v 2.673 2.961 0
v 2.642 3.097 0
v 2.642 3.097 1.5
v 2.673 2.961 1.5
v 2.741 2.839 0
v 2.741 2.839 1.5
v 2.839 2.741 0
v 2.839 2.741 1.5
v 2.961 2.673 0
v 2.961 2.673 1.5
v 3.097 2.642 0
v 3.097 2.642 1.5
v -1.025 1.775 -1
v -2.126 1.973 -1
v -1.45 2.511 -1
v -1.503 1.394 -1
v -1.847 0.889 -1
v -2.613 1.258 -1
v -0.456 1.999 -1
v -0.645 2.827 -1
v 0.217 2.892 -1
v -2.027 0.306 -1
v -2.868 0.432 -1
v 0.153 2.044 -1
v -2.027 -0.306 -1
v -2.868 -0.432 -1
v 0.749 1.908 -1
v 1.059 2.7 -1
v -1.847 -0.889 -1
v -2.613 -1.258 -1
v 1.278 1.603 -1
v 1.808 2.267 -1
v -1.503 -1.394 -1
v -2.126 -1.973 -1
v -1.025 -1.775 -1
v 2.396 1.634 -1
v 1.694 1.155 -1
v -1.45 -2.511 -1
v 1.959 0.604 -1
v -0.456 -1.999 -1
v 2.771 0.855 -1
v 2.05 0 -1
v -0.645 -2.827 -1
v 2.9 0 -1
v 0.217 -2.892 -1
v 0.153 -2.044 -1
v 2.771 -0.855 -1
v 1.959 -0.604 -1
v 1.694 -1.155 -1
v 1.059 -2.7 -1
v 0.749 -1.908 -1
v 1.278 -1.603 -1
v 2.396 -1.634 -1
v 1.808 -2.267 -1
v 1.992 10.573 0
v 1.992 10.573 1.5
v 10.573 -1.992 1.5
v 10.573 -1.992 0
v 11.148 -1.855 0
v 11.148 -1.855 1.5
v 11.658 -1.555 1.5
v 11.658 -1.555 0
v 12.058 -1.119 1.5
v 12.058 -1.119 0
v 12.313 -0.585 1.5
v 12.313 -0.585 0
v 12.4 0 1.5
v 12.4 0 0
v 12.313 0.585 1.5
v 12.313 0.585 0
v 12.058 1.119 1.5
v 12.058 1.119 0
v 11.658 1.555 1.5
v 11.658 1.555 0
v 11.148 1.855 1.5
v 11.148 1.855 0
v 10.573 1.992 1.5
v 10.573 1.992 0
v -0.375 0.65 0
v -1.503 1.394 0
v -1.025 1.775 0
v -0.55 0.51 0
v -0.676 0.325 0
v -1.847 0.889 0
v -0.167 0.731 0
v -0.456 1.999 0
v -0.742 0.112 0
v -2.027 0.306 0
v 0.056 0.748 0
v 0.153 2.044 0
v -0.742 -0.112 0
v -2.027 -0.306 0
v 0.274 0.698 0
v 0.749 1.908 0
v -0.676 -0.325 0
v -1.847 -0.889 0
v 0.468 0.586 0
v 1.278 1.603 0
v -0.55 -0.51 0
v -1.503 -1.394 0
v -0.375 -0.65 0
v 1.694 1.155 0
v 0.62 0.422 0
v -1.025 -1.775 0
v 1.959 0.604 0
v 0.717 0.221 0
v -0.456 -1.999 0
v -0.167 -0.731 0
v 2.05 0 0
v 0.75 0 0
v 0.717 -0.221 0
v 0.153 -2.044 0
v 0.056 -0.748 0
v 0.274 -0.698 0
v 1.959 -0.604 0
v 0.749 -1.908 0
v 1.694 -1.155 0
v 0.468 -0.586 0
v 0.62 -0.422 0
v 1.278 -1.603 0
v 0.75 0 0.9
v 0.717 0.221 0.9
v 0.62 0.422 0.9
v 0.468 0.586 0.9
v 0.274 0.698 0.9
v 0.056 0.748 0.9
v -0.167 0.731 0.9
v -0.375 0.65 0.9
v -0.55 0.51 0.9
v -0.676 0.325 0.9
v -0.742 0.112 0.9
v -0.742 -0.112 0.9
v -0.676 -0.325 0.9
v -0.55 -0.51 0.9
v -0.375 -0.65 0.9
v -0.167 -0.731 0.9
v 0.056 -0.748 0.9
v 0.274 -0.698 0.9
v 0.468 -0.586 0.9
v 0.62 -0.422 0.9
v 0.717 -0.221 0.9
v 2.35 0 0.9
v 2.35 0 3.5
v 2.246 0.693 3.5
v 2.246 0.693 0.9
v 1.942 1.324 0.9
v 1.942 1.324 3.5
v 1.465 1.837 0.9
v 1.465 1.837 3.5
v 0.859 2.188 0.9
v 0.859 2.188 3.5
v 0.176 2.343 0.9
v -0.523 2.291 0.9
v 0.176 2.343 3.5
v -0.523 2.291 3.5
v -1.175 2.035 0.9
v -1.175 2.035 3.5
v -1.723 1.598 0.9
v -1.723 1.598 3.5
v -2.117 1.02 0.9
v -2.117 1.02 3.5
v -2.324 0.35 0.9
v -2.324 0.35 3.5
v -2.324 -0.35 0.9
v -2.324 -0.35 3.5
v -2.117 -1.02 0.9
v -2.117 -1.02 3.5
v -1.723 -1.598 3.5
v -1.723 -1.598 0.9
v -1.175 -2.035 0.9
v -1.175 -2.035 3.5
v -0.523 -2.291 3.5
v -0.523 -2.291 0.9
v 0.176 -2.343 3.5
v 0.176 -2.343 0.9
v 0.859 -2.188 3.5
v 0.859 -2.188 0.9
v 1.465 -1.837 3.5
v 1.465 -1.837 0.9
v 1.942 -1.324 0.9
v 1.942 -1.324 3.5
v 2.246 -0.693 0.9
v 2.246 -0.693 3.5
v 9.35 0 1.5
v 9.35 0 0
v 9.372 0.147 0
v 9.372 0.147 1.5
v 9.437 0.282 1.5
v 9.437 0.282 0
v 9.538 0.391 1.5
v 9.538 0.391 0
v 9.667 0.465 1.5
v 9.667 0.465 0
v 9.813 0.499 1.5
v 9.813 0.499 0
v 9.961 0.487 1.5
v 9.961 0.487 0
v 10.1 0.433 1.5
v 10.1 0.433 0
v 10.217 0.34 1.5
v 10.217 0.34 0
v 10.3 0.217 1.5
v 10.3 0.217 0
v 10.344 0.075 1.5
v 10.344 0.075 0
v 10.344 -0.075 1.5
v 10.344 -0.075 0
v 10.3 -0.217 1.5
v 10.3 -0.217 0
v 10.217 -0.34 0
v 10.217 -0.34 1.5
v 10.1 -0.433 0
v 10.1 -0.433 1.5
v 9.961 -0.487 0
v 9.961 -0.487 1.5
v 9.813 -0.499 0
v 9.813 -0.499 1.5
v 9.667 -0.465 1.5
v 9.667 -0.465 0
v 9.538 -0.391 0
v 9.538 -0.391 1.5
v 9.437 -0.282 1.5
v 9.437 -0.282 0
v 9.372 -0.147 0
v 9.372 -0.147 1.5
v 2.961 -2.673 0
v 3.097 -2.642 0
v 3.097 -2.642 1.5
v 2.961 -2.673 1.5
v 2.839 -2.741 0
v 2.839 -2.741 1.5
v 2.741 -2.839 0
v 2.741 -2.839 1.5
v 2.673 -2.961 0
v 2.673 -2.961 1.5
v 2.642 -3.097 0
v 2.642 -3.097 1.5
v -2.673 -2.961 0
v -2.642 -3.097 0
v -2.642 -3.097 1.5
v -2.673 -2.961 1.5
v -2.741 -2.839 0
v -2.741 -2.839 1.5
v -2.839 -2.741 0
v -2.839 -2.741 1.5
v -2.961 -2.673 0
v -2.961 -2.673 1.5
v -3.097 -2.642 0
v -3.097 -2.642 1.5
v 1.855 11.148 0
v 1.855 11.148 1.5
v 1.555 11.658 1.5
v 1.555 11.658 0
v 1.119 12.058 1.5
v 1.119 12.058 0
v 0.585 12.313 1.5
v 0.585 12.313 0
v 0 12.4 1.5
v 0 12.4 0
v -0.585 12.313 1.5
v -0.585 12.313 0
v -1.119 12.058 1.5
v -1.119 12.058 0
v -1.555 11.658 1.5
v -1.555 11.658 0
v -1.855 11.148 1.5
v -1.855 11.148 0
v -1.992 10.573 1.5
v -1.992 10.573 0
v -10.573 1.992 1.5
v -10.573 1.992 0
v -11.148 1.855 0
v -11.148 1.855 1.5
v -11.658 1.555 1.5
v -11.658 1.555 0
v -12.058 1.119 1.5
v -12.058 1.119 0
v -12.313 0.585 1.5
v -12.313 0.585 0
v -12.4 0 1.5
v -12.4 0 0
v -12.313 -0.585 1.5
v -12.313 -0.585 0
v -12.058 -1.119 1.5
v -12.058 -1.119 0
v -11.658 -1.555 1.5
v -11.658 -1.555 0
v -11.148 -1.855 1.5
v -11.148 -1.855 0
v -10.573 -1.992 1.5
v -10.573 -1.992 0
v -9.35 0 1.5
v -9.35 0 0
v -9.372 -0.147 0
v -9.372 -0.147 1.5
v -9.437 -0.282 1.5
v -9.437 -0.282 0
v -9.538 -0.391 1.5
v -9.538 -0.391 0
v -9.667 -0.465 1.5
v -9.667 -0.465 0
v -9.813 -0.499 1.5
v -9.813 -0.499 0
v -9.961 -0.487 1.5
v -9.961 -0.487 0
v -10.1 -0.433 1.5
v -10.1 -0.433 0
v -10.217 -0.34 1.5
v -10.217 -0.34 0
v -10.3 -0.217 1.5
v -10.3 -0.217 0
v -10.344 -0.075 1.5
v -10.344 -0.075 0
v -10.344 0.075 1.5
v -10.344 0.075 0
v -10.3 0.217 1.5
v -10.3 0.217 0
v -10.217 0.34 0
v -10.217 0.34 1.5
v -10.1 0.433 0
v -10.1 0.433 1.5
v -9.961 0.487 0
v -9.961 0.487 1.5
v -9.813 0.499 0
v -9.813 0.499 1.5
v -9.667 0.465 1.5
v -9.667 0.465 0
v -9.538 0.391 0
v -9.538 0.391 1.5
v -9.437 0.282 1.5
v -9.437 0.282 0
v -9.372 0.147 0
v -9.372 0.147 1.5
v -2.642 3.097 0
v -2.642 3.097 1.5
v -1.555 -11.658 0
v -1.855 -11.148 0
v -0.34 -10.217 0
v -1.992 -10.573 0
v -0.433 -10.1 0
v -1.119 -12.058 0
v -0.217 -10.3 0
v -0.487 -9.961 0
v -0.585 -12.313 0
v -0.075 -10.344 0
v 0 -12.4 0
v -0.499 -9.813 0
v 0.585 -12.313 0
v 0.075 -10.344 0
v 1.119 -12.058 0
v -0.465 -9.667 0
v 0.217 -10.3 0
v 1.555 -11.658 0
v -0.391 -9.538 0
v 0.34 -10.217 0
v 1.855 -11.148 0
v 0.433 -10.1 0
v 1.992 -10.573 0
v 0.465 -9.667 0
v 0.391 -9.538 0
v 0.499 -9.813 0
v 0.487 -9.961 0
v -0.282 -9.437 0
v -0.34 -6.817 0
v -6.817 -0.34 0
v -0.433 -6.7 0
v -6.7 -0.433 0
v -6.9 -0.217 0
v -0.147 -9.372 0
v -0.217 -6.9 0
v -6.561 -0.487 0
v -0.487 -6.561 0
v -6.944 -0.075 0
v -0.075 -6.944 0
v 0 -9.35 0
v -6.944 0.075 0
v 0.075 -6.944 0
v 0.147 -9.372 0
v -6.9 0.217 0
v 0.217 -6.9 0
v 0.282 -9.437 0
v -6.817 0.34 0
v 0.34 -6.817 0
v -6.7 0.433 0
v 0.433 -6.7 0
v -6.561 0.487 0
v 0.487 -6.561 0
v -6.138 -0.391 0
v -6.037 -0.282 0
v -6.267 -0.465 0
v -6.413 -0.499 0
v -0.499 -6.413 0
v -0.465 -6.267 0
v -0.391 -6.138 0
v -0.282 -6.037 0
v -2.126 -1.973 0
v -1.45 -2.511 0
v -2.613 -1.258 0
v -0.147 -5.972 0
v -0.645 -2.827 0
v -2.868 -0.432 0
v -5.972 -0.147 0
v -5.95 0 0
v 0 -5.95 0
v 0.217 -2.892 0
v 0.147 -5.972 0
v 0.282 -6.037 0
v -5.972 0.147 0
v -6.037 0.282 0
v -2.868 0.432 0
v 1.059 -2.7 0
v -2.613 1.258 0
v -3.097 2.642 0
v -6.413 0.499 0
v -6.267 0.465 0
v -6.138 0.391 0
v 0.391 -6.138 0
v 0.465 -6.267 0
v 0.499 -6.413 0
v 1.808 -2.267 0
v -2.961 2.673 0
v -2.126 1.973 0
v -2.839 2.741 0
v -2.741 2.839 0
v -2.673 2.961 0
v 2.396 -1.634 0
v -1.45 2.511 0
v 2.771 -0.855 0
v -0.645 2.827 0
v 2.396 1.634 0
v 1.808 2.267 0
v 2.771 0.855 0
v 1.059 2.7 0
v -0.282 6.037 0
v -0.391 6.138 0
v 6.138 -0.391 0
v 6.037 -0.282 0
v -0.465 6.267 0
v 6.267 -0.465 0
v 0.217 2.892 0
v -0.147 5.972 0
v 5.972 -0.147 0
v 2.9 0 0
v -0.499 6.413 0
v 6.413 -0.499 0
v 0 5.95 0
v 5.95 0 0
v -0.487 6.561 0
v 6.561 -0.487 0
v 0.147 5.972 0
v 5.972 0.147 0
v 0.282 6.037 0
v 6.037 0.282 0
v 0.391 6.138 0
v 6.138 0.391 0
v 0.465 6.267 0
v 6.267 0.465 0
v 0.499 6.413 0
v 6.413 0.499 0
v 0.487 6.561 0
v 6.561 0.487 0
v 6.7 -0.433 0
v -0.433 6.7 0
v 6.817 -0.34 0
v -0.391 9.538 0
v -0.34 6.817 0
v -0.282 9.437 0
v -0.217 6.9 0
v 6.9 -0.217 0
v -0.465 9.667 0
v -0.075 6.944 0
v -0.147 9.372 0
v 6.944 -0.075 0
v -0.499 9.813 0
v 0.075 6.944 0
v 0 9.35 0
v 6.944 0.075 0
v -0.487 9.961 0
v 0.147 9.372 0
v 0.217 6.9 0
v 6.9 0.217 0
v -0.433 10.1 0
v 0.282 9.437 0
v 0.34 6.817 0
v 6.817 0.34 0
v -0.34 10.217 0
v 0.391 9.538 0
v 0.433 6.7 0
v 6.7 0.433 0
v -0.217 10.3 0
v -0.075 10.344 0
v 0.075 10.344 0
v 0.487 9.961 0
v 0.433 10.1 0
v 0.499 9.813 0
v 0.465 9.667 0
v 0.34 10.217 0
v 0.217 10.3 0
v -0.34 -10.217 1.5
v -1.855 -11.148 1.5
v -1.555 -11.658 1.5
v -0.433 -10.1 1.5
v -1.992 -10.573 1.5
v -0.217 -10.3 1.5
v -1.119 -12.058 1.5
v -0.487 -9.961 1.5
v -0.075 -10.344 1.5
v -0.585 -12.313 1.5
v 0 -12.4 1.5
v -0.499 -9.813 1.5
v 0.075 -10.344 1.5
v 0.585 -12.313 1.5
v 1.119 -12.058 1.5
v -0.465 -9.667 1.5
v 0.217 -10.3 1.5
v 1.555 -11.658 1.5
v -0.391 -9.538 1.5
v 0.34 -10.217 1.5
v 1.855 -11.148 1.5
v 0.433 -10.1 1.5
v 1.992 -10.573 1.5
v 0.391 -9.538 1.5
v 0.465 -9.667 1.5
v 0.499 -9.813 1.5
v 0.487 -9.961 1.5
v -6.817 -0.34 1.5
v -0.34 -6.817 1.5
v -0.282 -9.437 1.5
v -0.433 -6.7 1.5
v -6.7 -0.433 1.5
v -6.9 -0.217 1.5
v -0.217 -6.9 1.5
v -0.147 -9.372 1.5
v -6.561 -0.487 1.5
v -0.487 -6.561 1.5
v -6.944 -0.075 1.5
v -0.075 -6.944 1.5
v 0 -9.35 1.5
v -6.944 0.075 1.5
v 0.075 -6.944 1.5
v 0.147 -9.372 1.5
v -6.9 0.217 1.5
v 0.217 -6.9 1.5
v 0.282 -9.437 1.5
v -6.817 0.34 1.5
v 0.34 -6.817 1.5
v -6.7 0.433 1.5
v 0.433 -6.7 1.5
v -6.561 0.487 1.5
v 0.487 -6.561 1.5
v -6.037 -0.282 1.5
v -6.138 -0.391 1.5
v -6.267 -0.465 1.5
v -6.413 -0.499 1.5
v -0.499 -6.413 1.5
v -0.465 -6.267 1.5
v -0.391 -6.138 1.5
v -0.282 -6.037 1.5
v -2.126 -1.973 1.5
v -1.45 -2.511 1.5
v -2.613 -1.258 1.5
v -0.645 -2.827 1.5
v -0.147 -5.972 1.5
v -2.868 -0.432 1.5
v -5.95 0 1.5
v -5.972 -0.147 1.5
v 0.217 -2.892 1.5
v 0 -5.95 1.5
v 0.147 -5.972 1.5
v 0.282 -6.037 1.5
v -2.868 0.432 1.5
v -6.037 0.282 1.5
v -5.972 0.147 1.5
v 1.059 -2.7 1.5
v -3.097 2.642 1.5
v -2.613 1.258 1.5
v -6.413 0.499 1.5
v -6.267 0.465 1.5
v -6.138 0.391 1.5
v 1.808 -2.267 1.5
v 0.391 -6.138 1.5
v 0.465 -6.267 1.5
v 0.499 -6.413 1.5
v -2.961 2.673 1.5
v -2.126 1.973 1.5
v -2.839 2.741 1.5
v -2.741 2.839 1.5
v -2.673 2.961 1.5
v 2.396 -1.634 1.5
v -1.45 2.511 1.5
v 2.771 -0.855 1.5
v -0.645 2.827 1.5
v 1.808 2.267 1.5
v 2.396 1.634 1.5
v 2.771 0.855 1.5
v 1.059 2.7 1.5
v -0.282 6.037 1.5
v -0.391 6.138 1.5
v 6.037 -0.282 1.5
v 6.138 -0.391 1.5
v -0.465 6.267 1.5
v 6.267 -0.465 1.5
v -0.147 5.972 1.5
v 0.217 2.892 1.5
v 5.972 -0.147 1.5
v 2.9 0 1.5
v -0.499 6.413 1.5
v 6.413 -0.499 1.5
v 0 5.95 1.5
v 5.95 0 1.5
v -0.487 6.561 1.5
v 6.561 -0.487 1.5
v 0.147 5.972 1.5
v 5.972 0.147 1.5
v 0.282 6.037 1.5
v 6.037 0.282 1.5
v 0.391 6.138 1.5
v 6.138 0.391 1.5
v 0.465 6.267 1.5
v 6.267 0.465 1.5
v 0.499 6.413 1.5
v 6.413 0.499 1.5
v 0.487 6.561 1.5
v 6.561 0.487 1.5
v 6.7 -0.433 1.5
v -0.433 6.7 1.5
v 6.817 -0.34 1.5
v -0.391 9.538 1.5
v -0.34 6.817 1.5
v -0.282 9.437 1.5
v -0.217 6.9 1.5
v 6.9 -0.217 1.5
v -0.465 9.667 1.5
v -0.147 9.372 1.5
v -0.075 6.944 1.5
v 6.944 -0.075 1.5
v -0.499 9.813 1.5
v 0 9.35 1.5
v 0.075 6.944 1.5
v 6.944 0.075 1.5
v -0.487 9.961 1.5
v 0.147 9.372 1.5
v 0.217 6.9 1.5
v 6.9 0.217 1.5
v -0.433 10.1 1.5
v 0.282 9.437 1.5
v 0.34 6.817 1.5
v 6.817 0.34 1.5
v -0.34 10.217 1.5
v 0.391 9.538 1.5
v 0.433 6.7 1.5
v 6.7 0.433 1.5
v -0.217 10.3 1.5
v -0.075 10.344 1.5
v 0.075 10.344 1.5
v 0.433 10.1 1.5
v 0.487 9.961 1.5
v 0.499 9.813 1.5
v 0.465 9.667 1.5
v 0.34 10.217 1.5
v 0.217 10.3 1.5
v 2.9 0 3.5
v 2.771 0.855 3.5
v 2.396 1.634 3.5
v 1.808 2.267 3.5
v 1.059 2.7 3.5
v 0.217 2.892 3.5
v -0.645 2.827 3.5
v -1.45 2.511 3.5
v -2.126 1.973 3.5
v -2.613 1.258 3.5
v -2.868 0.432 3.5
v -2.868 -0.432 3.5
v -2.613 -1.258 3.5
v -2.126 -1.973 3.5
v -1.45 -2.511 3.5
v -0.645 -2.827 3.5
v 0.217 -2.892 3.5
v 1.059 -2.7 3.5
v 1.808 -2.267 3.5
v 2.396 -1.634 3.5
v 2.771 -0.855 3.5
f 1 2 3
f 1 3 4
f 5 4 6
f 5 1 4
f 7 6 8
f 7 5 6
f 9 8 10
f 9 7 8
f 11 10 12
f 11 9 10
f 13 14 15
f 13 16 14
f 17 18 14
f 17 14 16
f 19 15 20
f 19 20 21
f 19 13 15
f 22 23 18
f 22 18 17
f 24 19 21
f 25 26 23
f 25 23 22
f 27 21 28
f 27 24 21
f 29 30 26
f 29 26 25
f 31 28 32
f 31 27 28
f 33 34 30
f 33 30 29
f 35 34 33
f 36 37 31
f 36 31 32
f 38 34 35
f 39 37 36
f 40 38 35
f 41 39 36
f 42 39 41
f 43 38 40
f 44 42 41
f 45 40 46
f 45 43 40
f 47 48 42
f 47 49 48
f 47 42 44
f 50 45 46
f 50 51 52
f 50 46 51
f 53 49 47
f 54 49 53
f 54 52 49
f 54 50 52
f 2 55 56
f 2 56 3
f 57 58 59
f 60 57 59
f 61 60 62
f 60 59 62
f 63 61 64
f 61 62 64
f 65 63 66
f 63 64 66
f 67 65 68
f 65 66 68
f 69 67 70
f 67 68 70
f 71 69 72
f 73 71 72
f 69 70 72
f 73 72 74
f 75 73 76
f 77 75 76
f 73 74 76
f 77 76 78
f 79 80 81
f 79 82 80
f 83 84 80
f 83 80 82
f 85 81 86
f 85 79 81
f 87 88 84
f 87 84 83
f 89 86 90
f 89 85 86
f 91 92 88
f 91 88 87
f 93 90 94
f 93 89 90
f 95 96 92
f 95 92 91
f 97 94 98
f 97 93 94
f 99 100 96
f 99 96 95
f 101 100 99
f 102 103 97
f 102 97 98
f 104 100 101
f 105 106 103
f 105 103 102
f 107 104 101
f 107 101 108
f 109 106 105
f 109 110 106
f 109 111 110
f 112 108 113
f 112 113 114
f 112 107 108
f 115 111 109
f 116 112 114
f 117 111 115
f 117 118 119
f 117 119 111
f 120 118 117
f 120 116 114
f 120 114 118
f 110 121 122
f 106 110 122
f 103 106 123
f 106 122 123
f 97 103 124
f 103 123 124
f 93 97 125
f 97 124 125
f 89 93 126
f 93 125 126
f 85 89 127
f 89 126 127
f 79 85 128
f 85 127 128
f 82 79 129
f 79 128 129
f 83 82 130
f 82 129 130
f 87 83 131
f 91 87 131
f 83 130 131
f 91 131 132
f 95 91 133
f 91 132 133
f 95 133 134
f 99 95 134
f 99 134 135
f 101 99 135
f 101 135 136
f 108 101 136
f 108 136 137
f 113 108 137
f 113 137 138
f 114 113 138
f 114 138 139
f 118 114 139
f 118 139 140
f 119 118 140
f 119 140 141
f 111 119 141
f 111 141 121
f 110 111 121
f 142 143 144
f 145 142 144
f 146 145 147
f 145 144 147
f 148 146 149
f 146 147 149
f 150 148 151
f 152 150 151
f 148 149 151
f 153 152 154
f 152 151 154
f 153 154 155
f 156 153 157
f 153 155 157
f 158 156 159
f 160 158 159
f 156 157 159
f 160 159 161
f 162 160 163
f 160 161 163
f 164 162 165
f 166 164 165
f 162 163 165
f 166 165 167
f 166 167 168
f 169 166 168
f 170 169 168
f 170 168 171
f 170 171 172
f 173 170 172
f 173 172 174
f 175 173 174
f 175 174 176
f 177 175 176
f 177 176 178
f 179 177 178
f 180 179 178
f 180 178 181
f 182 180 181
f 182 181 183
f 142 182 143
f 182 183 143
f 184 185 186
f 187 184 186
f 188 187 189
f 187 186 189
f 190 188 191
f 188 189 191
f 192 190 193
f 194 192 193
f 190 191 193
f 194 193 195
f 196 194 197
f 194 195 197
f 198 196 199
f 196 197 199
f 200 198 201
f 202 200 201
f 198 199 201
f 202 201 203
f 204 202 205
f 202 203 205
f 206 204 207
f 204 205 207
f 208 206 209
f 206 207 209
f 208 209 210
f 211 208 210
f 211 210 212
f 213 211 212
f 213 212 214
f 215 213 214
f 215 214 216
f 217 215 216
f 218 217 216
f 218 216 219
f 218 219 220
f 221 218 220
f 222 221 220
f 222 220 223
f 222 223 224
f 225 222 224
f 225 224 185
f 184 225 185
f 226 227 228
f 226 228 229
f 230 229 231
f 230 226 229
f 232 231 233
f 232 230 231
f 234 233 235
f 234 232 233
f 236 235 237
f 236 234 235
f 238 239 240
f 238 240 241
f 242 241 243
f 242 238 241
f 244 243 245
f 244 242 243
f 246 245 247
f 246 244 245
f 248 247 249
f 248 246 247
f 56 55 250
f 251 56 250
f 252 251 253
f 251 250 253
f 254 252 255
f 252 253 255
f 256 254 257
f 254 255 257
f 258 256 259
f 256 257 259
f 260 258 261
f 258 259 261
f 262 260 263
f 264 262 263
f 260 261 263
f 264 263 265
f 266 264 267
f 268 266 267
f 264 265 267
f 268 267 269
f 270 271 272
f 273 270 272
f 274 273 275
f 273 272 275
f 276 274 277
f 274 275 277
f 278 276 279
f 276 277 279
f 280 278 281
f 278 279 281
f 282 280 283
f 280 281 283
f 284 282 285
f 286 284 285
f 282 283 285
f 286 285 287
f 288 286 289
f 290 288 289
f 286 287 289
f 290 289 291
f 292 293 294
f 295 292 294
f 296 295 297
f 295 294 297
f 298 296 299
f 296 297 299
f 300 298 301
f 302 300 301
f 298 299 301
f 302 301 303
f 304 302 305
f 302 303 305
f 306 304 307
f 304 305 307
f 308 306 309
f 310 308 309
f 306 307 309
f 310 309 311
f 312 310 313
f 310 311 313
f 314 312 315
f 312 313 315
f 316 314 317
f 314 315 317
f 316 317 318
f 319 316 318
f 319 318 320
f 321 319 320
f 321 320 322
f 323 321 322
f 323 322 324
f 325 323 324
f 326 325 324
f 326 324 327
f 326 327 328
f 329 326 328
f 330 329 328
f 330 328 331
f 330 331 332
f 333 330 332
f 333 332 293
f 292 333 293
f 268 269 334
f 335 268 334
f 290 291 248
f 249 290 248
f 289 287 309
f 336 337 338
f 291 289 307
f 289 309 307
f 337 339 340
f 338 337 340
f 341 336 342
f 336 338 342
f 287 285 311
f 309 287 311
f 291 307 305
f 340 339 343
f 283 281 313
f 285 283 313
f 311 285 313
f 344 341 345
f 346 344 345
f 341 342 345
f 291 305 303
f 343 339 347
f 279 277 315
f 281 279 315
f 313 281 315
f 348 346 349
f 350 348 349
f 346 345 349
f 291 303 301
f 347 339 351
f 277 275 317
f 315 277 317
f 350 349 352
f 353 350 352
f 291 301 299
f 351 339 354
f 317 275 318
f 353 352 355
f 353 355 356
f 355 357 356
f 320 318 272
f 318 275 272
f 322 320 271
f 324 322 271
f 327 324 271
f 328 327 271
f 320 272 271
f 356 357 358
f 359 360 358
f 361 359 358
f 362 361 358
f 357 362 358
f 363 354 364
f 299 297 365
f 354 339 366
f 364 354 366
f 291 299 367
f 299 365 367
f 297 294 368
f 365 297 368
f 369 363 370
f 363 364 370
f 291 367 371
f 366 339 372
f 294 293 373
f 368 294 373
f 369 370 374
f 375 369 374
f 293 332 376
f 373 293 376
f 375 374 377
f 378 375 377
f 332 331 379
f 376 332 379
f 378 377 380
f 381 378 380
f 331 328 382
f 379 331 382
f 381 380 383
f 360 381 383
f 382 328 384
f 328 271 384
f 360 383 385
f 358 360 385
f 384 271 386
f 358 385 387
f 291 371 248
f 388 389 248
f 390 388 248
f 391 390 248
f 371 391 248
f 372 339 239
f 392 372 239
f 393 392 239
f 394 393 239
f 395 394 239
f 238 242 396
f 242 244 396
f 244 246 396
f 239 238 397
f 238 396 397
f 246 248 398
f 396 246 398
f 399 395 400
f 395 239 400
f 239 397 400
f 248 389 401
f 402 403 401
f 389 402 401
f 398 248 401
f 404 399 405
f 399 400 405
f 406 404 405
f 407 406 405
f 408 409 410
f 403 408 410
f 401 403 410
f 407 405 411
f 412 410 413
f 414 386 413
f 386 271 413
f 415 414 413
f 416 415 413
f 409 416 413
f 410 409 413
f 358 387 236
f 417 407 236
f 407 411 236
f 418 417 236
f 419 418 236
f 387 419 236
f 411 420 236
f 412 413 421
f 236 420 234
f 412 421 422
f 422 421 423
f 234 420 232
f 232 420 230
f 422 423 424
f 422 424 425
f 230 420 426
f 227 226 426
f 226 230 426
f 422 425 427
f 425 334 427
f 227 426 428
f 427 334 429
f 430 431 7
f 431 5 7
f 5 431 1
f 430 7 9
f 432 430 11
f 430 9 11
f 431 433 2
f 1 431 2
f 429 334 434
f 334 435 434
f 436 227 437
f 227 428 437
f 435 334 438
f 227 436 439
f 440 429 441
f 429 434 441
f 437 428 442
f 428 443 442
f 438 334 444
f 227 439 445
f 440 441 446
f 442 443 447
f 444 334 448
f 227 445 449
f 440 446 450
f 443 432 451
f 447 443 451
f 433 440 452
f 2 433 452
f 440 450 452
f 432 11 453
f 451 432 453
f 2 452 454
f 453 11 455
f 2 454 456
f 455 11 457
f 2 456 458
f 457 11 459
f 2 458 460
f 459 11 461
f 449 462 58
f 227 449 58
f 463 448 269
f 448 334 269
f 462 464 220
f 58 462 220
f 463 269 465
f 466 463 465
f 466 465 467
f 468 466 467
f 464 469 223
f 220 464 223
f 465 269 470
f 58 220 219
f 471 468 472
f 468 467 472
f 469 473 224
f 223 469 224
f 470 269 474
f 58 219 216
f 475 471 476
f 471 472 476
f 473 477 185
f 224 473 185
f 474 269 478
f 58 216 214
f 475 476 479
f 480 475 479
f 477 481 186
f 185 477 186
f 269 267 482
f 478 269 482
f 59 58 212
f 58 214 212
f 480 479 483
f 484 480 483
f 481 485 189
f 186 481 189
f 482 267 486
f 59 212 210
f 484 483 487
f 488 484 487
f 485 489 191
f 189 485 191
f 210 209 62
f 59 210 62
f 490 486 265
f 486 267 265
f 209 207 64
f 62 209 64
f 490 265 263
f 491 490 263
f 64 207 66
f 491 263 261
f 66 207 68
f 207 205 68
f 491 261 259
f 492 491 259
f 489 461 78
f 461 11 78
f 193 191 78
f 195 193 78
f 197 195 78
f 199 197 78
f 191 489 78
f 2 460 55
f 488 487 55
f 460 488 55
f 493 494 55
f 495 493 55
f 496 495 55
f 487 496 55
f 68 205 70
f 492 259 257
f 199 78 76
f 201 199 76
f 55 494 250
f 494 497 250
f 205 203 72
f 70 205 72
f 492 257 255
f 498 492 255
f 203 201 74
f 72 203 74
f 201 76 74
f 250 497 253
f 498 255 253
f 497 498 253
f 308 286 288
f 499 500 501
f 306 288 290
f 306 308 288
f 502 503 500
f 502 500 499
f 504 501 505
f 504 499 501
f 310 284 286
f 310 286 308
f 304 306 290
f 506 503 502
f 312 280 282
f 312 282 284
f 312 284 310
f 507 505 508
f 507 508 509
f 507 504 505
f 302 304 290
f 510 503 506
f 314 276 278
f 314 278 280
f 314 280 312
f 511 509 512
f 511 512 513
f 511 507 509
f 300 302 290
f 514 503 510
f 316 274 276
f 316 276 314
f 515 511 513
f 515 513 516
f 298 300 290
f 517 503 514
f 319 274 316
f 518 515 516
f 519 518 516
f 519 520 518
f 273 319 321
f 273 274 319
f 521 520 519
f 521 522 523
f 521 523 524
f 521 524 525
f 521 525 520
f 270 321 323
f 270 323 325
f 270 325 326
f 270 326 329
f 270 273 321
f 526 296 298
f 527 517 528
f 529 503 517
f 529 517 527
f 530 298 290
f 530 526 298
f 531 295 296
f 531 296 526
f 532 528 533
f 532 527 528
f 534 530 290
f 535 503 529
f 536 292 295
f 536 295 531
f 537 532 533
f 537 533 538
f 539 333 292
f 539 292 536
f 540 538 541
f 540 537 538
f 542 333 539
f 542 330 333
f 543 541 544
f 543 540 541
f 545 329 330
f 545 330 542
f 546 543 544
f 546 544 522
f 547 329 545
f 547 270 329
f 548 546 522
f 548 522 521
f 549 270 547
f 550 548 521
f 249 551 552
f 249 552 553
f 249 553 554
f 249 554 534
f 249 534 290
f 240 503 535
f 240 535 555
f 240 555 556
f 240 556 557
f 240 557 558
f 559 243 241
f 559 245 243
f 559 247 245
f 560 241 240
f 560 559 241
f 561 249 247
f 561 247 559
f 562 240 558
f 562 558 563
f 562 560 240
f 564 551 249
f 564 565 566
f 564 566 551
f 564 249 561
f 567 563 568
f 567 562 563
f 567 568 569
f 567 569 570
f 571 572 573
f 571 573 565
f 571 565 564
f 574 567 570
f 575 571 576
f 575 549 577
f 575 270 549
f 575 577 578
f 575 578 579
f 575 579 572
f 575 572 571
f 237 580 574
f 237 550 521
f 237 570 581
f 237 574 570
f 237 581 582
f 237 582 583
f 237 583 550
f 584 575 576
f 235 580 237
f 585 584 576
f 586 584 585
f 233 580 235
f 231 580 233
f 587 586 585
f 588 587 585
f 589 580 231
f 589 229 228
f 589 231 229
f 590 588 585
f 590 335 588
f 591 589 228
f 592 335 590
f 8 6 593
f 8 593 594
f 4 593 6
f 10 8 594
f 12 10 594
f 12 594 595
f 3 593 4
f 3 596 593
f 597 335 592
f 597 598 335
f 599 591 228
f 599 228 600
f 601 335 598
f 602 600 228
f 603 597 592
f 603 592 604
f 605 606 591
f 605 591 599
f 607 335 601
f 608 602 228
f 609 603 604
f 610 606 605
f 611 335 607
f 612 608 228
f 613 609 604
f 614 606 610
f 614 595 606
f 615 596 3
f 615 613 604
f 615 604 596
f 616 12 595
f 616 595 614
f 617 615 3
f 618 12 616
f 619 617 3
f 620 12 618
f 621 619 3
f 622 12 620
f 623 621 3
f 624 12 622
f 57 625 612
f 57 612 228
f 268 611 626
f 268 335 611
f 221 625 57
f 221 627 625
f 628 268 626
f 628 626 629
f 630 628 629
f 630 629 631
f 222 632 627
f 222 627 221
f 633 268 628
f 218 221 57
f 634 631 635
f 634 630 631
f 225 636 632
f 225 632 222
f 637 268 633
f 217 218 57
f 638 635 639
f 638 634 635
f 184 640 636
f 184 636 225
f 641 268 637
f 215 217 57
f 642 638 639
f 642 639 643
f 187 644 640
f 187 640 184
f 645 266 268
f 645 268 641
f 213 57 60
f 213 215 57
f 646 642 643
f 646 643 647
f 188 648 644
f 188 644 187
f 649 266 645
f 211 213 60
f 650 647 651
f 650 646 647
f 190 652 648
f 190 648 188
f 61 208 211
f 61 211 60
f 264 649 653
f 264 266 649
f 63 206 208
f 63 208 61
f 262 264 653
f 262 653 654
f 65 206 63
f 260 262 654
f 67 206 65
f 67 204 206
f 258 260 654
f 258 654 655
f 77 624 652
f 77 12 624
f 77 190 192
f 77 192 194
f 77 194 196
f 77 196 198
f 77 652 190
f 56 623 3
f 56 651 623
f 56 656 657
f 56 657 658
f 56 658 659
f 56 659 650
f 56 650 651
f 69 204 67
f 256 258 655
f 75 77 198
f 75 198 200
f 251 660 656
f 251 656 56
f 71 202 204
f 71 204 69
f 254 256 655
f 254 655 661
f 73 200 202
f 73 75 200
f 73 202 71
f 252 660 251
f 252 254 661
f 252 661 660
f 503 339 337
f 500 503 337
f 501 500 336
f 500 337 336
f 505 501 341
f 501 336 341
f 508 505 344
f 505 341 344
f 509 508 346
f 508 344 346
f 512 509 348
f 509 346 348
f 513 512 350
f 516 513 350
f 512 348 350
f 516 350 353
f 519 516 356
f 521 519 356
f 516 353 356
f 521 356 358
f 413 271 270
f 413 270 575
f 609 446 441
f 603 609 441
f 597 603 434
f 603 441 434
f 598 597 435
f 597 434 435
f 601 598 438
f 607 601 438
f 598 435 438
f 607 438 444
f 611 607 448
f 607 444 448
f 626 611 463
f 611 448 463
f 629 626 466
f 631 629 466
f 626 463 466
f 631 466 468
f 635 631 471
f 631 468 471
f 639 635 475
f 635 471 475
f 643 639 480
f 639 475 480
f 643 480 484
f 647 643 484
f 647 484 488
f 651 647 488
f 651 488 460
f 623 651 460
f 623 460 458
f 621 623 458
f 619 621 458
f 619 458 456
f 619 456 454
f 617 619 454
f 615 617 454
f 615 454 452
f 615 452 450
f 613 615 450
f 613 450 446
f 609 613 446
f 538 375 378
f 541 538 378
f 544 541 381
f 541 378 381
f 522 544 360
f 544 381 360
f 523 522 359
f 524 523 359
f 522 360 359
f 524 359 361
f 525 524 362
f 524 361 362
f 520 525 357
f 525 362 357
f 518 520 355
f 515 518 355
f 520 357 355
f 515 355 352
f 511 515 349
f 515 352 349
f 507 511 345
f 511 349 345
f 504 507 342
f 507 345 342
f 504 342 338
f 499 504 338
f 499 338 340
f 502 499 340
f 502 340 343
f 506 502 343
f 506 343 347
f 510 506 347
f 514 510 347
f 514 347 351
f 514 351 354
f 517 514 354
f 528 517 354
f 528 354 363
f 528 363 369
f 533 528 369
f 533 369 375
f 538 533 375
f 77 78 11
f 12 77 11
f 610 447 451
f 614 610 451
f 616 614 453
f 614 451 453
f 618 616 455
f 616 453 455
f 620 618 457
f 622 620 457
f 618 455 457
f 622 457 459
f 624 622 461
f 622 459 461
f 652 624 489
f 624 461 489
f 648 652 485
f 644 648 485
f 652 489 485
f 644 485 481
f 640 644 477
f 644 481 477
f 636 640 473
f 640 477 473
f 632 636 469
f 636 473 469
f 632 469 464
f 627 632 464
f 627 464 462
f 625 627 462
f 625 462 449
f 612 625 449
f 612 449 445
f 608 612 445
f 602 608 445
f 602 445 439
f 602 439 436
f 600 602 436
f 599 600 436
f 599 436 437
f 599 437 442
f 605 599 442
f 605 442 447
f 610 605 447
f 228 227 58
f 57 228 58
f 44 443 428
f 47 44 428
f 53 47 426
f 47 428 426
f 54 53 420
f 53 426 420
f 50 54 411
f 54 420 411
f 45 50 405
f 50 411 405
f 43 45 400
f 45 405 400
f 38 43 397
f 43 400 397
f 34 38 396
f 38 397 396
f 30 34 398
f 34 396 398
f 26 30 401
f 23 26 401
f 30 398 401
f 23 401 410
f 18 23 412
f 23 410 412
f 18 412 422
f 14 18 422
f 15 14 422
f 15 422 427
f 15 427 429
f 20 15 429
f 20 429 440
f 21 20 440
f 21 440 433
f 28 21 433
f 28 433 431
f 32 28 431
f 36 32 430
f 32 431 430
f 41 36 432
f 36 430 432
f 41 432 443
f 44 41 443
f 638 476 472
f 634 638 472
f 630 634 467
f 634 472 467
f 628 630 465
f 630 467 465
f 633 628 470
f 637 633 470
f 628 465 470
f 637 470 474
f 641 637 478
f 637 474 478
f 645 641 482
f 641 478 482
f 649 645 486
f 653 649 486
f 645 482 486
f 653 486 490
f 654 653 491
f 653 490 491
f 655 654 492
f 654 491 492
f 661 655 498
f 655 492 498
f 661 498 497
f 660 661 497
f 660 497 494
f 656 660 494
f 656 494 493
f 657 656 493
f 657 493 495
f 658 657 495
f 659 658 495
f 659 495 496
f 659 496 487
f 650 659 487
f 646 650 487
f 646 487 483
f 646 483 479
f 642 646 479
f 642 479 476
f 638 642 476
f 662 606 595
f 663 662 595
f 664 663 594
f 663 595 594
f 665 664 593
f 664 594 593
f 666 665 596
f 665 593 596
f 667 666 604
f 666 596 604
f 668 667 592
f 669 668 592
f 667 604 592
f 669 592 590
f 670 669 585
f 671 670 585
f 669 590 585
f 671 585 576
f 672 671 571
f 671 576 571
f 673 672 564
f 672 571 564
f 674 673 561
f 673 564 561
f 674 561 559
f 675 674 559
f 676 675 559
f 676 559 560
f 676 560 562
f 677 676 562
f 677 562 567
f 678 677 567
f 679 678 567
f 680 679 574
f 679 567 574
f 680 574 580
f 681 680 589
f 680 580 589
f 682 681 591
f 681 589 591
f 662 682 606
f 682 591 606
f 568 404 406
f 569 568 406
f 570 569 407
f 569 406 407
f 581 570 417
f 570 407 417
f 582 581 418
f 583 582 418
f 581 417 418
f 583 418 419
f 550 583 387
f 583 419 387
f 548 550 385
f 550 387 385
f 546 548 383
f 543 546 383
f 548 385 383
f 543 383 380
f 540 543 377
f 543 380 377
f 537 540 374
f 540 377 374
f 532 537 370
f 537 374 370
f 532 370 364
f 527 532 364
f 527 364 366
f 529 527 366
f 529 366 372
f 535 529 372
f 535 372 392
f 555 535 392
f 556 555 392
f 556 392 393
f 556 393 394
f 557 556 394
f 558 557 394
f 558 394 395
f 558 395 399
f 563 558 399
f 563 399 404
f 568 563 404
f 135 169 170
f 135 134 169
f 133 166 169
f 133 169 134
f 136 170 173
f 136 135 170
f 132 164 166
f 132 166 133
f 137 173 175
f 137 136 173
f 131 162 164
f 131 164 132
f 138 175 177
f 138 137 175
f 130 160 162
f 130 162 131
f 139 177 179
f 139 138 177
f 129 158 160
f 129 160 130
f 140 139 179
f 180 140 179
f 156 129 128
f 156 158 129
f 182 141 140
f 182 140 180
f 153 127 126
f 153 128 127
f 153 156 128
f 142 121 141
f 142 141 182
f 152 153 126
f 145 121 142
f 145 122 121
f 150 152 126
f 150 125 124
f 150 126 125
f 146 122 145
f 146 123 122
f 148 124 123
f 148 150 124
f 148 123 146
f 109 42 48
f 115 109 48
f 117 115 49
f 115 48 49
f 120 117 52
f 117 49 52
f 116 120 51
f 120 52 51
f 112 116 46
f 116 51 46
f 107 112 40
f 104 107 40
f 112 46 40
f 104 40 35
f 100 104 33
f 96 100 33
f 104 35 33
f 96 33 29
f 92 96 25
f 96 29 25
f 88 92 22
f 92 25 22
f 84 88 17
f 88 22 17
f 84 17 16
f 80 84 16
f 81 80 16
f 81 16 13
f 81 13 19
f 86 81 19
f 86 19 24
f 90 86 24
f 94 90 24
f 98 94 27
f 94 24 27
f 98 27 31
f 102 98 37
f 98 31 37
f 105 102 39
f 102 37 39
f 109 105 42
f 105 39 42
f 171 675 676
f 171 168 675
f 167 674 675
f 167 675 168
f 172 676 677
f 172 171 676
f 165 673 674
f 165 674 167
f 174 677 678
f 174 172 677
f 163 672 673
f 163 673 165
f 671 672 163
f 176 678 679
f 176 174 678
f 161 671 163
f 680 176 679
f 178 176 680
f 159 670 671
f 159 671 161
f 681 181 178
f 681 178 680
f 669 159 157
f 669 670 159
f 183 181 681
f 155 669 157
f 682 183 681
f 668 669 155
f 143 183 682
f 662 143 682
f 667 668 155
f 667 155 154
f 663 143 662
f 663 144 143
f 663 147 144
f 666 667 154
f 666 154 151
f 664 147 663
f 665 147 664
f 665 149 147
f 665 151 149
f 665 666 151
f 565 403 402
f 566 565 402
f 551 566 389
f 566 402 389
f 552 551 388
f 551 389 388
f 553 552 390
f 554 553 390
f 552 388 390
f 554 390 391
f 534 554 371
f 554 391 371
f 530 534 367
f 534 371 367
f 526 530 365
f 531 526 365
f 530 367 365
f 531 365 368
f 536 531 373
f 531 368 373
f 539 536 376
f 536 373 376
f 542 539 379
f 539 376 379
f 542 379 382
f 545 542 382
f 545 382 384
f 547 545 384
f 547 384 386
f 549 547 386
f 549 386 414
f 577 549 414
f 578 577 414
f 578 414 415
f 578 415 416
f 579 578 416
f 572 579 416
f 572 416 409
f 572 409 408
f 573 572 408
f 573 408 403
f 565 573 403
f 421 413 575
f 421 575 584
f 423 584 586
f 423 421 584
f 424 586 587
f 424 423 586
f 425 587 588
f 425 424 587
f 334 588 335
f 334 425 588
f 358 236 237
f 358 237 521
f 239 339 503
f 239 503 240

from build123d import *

# Parameters (mm, degrees)
PAD_DEPTH          = 1.5
SKETCH001_R        = 2.9
PAD001_DEPTH       = 2
SKETCH002_R        = 2.35
POCKET_DEPTH       = 2.6
SKETCH003_R        = 0.75
POCKET001_DEPTH    = 0.901
SKETCH004_R        = 2.9
PAD002_DEPTH       = 1
SKETCH005_R        = 2.05
POCKET002_DEPTH    = 1
SKETCH006_R        = 0.5
POCKET003_DEPTH    = 74.221011
POLARPATTERN_COUNT = 4


with BuildPart() as part:
    # Sketch → Pad (new body)
    with BuildSketch(Plane.XY):
        with BuildLine():
            ThreePointArc((-10.573077, 1.992497), (-12.4, 0), (-10.573077, -1.992497))
            Line((-10.573077, -1.992497), (-3.096776, -2.641921))
            ThreePointArc((-2.641921, -3.096776), (-2.786492, -2.786492), (-3.096776, -2.641921))
            Line((-1.992497, -10.573077), (-2.641921, -3.096776))
            ThreePointArc((-1.992497, -10.573077), (0, -12.4), (1.992497, -10.573077))
            Line((2.641921, -3.096776), (1.992497, -10.573077))
            ThreePointArc((3.096776, -2.641921), (2.786492, -2.786492), (2.641921, -3.096776))
            Line((3.096776, -2.641921), (10.573077, -1.992497))
            ThreePointArc((10.573077, -1.992497), (12.4, 0), (10.573077, 1.992497))
            Line((10.573077, 1.992497), (3.096776, 2.641921))
            ThreePointArc((2.641921, 3.096776), (2.786492, 2.786492), (3.096776, 2.641921))
            Line((1.992497, 10.573077), (2.641921, 3.096776))
            ThreePointArc((1.992497, 10.573077), (0, 12.4), (-1.992497, 10.573077))
            Line((-1.992497, 10.573077), (-2.641921, 3.096776))
            ThreePointArc((-3.096776, 2.641921), (-2.786492, 2.786492), (-2.641921, 3.096776))
            Line((-10.573077, 1.992497), (-3.096776, 2.641921))
        make_face()
    extrude(amount=PAD_DEPTH)

    # Sketch001 → Pad001 (new body)
    with BuildSketch(Plane.XY.offset(1.5)):
        Circle(SKETCH001_R)
    extrude(amount=PAD001_DEPTH)

    # Sketch002 → Pocket (cut)
    with BuildSketch(Plane.XY.offset(3.5)):
        Circle(SKETCH002_R)
    extrude(amount=-POCKET_DEPTH, mode=Mode.SUBTRACT)

    # Sketch003 → Pocket001 (cut, through all)
    with BuildSketch(Plane.XY.offset(0.9)):
        Circle(SKETCH003_R)
    extrude(amount=-POCKET001_DEPTH, mode=Mode.SUBTRACT)

    # Sketch004 → Pad002 (new body)
    with BuildSketch(Plane(origin=(0, 0, 0), x_dir=(1, 0, 0), z_dir=(0, 0, -1))):
        Circle(SKETCH004_R)
    extrude(amount=PAD002_DEPTH)

    # Sketch005 → Pocket002 (cut)
    with BuildSketch(Plane(origin=(0, 0, -1), x_dir=(1, 0, 0), z_dir=(0, 0, -1))):
        Circle(SKETCH005_R)
    extrude(amount=-POCKET002_DEPTH, mode=Mode.SUBTRACT)

    # Sketch006 → Pocket003 (cut, through all)
    with BuildSketch(Plane(origin=(0, 0, 0), x_dir=(1, 0, 0), z_dir=(0, 0, -1))):
        with Locations((-6.45, 0)):
            Circle(SKETCH006_R)
        with Locations((-9.85, 0)):
            Circle(SKETCH006_R)
    pocket003 = extrude(amount=-POCKET003_DEPTH, mode=Mode.SUBTRACT)

    # PolarPattern: Pocket003 ×4 about axis
    polarpattern_axis = Axis((0, 0, 0), (0, 0, -1))
    for i in range(1, POLARPATTERN_COUNT):
        add(pocket003.rotate(polarpattern_axis, i * 360 / POLARPATTERN_COUNT), mode=Mode.SUBTRACT)


solid = part.part
